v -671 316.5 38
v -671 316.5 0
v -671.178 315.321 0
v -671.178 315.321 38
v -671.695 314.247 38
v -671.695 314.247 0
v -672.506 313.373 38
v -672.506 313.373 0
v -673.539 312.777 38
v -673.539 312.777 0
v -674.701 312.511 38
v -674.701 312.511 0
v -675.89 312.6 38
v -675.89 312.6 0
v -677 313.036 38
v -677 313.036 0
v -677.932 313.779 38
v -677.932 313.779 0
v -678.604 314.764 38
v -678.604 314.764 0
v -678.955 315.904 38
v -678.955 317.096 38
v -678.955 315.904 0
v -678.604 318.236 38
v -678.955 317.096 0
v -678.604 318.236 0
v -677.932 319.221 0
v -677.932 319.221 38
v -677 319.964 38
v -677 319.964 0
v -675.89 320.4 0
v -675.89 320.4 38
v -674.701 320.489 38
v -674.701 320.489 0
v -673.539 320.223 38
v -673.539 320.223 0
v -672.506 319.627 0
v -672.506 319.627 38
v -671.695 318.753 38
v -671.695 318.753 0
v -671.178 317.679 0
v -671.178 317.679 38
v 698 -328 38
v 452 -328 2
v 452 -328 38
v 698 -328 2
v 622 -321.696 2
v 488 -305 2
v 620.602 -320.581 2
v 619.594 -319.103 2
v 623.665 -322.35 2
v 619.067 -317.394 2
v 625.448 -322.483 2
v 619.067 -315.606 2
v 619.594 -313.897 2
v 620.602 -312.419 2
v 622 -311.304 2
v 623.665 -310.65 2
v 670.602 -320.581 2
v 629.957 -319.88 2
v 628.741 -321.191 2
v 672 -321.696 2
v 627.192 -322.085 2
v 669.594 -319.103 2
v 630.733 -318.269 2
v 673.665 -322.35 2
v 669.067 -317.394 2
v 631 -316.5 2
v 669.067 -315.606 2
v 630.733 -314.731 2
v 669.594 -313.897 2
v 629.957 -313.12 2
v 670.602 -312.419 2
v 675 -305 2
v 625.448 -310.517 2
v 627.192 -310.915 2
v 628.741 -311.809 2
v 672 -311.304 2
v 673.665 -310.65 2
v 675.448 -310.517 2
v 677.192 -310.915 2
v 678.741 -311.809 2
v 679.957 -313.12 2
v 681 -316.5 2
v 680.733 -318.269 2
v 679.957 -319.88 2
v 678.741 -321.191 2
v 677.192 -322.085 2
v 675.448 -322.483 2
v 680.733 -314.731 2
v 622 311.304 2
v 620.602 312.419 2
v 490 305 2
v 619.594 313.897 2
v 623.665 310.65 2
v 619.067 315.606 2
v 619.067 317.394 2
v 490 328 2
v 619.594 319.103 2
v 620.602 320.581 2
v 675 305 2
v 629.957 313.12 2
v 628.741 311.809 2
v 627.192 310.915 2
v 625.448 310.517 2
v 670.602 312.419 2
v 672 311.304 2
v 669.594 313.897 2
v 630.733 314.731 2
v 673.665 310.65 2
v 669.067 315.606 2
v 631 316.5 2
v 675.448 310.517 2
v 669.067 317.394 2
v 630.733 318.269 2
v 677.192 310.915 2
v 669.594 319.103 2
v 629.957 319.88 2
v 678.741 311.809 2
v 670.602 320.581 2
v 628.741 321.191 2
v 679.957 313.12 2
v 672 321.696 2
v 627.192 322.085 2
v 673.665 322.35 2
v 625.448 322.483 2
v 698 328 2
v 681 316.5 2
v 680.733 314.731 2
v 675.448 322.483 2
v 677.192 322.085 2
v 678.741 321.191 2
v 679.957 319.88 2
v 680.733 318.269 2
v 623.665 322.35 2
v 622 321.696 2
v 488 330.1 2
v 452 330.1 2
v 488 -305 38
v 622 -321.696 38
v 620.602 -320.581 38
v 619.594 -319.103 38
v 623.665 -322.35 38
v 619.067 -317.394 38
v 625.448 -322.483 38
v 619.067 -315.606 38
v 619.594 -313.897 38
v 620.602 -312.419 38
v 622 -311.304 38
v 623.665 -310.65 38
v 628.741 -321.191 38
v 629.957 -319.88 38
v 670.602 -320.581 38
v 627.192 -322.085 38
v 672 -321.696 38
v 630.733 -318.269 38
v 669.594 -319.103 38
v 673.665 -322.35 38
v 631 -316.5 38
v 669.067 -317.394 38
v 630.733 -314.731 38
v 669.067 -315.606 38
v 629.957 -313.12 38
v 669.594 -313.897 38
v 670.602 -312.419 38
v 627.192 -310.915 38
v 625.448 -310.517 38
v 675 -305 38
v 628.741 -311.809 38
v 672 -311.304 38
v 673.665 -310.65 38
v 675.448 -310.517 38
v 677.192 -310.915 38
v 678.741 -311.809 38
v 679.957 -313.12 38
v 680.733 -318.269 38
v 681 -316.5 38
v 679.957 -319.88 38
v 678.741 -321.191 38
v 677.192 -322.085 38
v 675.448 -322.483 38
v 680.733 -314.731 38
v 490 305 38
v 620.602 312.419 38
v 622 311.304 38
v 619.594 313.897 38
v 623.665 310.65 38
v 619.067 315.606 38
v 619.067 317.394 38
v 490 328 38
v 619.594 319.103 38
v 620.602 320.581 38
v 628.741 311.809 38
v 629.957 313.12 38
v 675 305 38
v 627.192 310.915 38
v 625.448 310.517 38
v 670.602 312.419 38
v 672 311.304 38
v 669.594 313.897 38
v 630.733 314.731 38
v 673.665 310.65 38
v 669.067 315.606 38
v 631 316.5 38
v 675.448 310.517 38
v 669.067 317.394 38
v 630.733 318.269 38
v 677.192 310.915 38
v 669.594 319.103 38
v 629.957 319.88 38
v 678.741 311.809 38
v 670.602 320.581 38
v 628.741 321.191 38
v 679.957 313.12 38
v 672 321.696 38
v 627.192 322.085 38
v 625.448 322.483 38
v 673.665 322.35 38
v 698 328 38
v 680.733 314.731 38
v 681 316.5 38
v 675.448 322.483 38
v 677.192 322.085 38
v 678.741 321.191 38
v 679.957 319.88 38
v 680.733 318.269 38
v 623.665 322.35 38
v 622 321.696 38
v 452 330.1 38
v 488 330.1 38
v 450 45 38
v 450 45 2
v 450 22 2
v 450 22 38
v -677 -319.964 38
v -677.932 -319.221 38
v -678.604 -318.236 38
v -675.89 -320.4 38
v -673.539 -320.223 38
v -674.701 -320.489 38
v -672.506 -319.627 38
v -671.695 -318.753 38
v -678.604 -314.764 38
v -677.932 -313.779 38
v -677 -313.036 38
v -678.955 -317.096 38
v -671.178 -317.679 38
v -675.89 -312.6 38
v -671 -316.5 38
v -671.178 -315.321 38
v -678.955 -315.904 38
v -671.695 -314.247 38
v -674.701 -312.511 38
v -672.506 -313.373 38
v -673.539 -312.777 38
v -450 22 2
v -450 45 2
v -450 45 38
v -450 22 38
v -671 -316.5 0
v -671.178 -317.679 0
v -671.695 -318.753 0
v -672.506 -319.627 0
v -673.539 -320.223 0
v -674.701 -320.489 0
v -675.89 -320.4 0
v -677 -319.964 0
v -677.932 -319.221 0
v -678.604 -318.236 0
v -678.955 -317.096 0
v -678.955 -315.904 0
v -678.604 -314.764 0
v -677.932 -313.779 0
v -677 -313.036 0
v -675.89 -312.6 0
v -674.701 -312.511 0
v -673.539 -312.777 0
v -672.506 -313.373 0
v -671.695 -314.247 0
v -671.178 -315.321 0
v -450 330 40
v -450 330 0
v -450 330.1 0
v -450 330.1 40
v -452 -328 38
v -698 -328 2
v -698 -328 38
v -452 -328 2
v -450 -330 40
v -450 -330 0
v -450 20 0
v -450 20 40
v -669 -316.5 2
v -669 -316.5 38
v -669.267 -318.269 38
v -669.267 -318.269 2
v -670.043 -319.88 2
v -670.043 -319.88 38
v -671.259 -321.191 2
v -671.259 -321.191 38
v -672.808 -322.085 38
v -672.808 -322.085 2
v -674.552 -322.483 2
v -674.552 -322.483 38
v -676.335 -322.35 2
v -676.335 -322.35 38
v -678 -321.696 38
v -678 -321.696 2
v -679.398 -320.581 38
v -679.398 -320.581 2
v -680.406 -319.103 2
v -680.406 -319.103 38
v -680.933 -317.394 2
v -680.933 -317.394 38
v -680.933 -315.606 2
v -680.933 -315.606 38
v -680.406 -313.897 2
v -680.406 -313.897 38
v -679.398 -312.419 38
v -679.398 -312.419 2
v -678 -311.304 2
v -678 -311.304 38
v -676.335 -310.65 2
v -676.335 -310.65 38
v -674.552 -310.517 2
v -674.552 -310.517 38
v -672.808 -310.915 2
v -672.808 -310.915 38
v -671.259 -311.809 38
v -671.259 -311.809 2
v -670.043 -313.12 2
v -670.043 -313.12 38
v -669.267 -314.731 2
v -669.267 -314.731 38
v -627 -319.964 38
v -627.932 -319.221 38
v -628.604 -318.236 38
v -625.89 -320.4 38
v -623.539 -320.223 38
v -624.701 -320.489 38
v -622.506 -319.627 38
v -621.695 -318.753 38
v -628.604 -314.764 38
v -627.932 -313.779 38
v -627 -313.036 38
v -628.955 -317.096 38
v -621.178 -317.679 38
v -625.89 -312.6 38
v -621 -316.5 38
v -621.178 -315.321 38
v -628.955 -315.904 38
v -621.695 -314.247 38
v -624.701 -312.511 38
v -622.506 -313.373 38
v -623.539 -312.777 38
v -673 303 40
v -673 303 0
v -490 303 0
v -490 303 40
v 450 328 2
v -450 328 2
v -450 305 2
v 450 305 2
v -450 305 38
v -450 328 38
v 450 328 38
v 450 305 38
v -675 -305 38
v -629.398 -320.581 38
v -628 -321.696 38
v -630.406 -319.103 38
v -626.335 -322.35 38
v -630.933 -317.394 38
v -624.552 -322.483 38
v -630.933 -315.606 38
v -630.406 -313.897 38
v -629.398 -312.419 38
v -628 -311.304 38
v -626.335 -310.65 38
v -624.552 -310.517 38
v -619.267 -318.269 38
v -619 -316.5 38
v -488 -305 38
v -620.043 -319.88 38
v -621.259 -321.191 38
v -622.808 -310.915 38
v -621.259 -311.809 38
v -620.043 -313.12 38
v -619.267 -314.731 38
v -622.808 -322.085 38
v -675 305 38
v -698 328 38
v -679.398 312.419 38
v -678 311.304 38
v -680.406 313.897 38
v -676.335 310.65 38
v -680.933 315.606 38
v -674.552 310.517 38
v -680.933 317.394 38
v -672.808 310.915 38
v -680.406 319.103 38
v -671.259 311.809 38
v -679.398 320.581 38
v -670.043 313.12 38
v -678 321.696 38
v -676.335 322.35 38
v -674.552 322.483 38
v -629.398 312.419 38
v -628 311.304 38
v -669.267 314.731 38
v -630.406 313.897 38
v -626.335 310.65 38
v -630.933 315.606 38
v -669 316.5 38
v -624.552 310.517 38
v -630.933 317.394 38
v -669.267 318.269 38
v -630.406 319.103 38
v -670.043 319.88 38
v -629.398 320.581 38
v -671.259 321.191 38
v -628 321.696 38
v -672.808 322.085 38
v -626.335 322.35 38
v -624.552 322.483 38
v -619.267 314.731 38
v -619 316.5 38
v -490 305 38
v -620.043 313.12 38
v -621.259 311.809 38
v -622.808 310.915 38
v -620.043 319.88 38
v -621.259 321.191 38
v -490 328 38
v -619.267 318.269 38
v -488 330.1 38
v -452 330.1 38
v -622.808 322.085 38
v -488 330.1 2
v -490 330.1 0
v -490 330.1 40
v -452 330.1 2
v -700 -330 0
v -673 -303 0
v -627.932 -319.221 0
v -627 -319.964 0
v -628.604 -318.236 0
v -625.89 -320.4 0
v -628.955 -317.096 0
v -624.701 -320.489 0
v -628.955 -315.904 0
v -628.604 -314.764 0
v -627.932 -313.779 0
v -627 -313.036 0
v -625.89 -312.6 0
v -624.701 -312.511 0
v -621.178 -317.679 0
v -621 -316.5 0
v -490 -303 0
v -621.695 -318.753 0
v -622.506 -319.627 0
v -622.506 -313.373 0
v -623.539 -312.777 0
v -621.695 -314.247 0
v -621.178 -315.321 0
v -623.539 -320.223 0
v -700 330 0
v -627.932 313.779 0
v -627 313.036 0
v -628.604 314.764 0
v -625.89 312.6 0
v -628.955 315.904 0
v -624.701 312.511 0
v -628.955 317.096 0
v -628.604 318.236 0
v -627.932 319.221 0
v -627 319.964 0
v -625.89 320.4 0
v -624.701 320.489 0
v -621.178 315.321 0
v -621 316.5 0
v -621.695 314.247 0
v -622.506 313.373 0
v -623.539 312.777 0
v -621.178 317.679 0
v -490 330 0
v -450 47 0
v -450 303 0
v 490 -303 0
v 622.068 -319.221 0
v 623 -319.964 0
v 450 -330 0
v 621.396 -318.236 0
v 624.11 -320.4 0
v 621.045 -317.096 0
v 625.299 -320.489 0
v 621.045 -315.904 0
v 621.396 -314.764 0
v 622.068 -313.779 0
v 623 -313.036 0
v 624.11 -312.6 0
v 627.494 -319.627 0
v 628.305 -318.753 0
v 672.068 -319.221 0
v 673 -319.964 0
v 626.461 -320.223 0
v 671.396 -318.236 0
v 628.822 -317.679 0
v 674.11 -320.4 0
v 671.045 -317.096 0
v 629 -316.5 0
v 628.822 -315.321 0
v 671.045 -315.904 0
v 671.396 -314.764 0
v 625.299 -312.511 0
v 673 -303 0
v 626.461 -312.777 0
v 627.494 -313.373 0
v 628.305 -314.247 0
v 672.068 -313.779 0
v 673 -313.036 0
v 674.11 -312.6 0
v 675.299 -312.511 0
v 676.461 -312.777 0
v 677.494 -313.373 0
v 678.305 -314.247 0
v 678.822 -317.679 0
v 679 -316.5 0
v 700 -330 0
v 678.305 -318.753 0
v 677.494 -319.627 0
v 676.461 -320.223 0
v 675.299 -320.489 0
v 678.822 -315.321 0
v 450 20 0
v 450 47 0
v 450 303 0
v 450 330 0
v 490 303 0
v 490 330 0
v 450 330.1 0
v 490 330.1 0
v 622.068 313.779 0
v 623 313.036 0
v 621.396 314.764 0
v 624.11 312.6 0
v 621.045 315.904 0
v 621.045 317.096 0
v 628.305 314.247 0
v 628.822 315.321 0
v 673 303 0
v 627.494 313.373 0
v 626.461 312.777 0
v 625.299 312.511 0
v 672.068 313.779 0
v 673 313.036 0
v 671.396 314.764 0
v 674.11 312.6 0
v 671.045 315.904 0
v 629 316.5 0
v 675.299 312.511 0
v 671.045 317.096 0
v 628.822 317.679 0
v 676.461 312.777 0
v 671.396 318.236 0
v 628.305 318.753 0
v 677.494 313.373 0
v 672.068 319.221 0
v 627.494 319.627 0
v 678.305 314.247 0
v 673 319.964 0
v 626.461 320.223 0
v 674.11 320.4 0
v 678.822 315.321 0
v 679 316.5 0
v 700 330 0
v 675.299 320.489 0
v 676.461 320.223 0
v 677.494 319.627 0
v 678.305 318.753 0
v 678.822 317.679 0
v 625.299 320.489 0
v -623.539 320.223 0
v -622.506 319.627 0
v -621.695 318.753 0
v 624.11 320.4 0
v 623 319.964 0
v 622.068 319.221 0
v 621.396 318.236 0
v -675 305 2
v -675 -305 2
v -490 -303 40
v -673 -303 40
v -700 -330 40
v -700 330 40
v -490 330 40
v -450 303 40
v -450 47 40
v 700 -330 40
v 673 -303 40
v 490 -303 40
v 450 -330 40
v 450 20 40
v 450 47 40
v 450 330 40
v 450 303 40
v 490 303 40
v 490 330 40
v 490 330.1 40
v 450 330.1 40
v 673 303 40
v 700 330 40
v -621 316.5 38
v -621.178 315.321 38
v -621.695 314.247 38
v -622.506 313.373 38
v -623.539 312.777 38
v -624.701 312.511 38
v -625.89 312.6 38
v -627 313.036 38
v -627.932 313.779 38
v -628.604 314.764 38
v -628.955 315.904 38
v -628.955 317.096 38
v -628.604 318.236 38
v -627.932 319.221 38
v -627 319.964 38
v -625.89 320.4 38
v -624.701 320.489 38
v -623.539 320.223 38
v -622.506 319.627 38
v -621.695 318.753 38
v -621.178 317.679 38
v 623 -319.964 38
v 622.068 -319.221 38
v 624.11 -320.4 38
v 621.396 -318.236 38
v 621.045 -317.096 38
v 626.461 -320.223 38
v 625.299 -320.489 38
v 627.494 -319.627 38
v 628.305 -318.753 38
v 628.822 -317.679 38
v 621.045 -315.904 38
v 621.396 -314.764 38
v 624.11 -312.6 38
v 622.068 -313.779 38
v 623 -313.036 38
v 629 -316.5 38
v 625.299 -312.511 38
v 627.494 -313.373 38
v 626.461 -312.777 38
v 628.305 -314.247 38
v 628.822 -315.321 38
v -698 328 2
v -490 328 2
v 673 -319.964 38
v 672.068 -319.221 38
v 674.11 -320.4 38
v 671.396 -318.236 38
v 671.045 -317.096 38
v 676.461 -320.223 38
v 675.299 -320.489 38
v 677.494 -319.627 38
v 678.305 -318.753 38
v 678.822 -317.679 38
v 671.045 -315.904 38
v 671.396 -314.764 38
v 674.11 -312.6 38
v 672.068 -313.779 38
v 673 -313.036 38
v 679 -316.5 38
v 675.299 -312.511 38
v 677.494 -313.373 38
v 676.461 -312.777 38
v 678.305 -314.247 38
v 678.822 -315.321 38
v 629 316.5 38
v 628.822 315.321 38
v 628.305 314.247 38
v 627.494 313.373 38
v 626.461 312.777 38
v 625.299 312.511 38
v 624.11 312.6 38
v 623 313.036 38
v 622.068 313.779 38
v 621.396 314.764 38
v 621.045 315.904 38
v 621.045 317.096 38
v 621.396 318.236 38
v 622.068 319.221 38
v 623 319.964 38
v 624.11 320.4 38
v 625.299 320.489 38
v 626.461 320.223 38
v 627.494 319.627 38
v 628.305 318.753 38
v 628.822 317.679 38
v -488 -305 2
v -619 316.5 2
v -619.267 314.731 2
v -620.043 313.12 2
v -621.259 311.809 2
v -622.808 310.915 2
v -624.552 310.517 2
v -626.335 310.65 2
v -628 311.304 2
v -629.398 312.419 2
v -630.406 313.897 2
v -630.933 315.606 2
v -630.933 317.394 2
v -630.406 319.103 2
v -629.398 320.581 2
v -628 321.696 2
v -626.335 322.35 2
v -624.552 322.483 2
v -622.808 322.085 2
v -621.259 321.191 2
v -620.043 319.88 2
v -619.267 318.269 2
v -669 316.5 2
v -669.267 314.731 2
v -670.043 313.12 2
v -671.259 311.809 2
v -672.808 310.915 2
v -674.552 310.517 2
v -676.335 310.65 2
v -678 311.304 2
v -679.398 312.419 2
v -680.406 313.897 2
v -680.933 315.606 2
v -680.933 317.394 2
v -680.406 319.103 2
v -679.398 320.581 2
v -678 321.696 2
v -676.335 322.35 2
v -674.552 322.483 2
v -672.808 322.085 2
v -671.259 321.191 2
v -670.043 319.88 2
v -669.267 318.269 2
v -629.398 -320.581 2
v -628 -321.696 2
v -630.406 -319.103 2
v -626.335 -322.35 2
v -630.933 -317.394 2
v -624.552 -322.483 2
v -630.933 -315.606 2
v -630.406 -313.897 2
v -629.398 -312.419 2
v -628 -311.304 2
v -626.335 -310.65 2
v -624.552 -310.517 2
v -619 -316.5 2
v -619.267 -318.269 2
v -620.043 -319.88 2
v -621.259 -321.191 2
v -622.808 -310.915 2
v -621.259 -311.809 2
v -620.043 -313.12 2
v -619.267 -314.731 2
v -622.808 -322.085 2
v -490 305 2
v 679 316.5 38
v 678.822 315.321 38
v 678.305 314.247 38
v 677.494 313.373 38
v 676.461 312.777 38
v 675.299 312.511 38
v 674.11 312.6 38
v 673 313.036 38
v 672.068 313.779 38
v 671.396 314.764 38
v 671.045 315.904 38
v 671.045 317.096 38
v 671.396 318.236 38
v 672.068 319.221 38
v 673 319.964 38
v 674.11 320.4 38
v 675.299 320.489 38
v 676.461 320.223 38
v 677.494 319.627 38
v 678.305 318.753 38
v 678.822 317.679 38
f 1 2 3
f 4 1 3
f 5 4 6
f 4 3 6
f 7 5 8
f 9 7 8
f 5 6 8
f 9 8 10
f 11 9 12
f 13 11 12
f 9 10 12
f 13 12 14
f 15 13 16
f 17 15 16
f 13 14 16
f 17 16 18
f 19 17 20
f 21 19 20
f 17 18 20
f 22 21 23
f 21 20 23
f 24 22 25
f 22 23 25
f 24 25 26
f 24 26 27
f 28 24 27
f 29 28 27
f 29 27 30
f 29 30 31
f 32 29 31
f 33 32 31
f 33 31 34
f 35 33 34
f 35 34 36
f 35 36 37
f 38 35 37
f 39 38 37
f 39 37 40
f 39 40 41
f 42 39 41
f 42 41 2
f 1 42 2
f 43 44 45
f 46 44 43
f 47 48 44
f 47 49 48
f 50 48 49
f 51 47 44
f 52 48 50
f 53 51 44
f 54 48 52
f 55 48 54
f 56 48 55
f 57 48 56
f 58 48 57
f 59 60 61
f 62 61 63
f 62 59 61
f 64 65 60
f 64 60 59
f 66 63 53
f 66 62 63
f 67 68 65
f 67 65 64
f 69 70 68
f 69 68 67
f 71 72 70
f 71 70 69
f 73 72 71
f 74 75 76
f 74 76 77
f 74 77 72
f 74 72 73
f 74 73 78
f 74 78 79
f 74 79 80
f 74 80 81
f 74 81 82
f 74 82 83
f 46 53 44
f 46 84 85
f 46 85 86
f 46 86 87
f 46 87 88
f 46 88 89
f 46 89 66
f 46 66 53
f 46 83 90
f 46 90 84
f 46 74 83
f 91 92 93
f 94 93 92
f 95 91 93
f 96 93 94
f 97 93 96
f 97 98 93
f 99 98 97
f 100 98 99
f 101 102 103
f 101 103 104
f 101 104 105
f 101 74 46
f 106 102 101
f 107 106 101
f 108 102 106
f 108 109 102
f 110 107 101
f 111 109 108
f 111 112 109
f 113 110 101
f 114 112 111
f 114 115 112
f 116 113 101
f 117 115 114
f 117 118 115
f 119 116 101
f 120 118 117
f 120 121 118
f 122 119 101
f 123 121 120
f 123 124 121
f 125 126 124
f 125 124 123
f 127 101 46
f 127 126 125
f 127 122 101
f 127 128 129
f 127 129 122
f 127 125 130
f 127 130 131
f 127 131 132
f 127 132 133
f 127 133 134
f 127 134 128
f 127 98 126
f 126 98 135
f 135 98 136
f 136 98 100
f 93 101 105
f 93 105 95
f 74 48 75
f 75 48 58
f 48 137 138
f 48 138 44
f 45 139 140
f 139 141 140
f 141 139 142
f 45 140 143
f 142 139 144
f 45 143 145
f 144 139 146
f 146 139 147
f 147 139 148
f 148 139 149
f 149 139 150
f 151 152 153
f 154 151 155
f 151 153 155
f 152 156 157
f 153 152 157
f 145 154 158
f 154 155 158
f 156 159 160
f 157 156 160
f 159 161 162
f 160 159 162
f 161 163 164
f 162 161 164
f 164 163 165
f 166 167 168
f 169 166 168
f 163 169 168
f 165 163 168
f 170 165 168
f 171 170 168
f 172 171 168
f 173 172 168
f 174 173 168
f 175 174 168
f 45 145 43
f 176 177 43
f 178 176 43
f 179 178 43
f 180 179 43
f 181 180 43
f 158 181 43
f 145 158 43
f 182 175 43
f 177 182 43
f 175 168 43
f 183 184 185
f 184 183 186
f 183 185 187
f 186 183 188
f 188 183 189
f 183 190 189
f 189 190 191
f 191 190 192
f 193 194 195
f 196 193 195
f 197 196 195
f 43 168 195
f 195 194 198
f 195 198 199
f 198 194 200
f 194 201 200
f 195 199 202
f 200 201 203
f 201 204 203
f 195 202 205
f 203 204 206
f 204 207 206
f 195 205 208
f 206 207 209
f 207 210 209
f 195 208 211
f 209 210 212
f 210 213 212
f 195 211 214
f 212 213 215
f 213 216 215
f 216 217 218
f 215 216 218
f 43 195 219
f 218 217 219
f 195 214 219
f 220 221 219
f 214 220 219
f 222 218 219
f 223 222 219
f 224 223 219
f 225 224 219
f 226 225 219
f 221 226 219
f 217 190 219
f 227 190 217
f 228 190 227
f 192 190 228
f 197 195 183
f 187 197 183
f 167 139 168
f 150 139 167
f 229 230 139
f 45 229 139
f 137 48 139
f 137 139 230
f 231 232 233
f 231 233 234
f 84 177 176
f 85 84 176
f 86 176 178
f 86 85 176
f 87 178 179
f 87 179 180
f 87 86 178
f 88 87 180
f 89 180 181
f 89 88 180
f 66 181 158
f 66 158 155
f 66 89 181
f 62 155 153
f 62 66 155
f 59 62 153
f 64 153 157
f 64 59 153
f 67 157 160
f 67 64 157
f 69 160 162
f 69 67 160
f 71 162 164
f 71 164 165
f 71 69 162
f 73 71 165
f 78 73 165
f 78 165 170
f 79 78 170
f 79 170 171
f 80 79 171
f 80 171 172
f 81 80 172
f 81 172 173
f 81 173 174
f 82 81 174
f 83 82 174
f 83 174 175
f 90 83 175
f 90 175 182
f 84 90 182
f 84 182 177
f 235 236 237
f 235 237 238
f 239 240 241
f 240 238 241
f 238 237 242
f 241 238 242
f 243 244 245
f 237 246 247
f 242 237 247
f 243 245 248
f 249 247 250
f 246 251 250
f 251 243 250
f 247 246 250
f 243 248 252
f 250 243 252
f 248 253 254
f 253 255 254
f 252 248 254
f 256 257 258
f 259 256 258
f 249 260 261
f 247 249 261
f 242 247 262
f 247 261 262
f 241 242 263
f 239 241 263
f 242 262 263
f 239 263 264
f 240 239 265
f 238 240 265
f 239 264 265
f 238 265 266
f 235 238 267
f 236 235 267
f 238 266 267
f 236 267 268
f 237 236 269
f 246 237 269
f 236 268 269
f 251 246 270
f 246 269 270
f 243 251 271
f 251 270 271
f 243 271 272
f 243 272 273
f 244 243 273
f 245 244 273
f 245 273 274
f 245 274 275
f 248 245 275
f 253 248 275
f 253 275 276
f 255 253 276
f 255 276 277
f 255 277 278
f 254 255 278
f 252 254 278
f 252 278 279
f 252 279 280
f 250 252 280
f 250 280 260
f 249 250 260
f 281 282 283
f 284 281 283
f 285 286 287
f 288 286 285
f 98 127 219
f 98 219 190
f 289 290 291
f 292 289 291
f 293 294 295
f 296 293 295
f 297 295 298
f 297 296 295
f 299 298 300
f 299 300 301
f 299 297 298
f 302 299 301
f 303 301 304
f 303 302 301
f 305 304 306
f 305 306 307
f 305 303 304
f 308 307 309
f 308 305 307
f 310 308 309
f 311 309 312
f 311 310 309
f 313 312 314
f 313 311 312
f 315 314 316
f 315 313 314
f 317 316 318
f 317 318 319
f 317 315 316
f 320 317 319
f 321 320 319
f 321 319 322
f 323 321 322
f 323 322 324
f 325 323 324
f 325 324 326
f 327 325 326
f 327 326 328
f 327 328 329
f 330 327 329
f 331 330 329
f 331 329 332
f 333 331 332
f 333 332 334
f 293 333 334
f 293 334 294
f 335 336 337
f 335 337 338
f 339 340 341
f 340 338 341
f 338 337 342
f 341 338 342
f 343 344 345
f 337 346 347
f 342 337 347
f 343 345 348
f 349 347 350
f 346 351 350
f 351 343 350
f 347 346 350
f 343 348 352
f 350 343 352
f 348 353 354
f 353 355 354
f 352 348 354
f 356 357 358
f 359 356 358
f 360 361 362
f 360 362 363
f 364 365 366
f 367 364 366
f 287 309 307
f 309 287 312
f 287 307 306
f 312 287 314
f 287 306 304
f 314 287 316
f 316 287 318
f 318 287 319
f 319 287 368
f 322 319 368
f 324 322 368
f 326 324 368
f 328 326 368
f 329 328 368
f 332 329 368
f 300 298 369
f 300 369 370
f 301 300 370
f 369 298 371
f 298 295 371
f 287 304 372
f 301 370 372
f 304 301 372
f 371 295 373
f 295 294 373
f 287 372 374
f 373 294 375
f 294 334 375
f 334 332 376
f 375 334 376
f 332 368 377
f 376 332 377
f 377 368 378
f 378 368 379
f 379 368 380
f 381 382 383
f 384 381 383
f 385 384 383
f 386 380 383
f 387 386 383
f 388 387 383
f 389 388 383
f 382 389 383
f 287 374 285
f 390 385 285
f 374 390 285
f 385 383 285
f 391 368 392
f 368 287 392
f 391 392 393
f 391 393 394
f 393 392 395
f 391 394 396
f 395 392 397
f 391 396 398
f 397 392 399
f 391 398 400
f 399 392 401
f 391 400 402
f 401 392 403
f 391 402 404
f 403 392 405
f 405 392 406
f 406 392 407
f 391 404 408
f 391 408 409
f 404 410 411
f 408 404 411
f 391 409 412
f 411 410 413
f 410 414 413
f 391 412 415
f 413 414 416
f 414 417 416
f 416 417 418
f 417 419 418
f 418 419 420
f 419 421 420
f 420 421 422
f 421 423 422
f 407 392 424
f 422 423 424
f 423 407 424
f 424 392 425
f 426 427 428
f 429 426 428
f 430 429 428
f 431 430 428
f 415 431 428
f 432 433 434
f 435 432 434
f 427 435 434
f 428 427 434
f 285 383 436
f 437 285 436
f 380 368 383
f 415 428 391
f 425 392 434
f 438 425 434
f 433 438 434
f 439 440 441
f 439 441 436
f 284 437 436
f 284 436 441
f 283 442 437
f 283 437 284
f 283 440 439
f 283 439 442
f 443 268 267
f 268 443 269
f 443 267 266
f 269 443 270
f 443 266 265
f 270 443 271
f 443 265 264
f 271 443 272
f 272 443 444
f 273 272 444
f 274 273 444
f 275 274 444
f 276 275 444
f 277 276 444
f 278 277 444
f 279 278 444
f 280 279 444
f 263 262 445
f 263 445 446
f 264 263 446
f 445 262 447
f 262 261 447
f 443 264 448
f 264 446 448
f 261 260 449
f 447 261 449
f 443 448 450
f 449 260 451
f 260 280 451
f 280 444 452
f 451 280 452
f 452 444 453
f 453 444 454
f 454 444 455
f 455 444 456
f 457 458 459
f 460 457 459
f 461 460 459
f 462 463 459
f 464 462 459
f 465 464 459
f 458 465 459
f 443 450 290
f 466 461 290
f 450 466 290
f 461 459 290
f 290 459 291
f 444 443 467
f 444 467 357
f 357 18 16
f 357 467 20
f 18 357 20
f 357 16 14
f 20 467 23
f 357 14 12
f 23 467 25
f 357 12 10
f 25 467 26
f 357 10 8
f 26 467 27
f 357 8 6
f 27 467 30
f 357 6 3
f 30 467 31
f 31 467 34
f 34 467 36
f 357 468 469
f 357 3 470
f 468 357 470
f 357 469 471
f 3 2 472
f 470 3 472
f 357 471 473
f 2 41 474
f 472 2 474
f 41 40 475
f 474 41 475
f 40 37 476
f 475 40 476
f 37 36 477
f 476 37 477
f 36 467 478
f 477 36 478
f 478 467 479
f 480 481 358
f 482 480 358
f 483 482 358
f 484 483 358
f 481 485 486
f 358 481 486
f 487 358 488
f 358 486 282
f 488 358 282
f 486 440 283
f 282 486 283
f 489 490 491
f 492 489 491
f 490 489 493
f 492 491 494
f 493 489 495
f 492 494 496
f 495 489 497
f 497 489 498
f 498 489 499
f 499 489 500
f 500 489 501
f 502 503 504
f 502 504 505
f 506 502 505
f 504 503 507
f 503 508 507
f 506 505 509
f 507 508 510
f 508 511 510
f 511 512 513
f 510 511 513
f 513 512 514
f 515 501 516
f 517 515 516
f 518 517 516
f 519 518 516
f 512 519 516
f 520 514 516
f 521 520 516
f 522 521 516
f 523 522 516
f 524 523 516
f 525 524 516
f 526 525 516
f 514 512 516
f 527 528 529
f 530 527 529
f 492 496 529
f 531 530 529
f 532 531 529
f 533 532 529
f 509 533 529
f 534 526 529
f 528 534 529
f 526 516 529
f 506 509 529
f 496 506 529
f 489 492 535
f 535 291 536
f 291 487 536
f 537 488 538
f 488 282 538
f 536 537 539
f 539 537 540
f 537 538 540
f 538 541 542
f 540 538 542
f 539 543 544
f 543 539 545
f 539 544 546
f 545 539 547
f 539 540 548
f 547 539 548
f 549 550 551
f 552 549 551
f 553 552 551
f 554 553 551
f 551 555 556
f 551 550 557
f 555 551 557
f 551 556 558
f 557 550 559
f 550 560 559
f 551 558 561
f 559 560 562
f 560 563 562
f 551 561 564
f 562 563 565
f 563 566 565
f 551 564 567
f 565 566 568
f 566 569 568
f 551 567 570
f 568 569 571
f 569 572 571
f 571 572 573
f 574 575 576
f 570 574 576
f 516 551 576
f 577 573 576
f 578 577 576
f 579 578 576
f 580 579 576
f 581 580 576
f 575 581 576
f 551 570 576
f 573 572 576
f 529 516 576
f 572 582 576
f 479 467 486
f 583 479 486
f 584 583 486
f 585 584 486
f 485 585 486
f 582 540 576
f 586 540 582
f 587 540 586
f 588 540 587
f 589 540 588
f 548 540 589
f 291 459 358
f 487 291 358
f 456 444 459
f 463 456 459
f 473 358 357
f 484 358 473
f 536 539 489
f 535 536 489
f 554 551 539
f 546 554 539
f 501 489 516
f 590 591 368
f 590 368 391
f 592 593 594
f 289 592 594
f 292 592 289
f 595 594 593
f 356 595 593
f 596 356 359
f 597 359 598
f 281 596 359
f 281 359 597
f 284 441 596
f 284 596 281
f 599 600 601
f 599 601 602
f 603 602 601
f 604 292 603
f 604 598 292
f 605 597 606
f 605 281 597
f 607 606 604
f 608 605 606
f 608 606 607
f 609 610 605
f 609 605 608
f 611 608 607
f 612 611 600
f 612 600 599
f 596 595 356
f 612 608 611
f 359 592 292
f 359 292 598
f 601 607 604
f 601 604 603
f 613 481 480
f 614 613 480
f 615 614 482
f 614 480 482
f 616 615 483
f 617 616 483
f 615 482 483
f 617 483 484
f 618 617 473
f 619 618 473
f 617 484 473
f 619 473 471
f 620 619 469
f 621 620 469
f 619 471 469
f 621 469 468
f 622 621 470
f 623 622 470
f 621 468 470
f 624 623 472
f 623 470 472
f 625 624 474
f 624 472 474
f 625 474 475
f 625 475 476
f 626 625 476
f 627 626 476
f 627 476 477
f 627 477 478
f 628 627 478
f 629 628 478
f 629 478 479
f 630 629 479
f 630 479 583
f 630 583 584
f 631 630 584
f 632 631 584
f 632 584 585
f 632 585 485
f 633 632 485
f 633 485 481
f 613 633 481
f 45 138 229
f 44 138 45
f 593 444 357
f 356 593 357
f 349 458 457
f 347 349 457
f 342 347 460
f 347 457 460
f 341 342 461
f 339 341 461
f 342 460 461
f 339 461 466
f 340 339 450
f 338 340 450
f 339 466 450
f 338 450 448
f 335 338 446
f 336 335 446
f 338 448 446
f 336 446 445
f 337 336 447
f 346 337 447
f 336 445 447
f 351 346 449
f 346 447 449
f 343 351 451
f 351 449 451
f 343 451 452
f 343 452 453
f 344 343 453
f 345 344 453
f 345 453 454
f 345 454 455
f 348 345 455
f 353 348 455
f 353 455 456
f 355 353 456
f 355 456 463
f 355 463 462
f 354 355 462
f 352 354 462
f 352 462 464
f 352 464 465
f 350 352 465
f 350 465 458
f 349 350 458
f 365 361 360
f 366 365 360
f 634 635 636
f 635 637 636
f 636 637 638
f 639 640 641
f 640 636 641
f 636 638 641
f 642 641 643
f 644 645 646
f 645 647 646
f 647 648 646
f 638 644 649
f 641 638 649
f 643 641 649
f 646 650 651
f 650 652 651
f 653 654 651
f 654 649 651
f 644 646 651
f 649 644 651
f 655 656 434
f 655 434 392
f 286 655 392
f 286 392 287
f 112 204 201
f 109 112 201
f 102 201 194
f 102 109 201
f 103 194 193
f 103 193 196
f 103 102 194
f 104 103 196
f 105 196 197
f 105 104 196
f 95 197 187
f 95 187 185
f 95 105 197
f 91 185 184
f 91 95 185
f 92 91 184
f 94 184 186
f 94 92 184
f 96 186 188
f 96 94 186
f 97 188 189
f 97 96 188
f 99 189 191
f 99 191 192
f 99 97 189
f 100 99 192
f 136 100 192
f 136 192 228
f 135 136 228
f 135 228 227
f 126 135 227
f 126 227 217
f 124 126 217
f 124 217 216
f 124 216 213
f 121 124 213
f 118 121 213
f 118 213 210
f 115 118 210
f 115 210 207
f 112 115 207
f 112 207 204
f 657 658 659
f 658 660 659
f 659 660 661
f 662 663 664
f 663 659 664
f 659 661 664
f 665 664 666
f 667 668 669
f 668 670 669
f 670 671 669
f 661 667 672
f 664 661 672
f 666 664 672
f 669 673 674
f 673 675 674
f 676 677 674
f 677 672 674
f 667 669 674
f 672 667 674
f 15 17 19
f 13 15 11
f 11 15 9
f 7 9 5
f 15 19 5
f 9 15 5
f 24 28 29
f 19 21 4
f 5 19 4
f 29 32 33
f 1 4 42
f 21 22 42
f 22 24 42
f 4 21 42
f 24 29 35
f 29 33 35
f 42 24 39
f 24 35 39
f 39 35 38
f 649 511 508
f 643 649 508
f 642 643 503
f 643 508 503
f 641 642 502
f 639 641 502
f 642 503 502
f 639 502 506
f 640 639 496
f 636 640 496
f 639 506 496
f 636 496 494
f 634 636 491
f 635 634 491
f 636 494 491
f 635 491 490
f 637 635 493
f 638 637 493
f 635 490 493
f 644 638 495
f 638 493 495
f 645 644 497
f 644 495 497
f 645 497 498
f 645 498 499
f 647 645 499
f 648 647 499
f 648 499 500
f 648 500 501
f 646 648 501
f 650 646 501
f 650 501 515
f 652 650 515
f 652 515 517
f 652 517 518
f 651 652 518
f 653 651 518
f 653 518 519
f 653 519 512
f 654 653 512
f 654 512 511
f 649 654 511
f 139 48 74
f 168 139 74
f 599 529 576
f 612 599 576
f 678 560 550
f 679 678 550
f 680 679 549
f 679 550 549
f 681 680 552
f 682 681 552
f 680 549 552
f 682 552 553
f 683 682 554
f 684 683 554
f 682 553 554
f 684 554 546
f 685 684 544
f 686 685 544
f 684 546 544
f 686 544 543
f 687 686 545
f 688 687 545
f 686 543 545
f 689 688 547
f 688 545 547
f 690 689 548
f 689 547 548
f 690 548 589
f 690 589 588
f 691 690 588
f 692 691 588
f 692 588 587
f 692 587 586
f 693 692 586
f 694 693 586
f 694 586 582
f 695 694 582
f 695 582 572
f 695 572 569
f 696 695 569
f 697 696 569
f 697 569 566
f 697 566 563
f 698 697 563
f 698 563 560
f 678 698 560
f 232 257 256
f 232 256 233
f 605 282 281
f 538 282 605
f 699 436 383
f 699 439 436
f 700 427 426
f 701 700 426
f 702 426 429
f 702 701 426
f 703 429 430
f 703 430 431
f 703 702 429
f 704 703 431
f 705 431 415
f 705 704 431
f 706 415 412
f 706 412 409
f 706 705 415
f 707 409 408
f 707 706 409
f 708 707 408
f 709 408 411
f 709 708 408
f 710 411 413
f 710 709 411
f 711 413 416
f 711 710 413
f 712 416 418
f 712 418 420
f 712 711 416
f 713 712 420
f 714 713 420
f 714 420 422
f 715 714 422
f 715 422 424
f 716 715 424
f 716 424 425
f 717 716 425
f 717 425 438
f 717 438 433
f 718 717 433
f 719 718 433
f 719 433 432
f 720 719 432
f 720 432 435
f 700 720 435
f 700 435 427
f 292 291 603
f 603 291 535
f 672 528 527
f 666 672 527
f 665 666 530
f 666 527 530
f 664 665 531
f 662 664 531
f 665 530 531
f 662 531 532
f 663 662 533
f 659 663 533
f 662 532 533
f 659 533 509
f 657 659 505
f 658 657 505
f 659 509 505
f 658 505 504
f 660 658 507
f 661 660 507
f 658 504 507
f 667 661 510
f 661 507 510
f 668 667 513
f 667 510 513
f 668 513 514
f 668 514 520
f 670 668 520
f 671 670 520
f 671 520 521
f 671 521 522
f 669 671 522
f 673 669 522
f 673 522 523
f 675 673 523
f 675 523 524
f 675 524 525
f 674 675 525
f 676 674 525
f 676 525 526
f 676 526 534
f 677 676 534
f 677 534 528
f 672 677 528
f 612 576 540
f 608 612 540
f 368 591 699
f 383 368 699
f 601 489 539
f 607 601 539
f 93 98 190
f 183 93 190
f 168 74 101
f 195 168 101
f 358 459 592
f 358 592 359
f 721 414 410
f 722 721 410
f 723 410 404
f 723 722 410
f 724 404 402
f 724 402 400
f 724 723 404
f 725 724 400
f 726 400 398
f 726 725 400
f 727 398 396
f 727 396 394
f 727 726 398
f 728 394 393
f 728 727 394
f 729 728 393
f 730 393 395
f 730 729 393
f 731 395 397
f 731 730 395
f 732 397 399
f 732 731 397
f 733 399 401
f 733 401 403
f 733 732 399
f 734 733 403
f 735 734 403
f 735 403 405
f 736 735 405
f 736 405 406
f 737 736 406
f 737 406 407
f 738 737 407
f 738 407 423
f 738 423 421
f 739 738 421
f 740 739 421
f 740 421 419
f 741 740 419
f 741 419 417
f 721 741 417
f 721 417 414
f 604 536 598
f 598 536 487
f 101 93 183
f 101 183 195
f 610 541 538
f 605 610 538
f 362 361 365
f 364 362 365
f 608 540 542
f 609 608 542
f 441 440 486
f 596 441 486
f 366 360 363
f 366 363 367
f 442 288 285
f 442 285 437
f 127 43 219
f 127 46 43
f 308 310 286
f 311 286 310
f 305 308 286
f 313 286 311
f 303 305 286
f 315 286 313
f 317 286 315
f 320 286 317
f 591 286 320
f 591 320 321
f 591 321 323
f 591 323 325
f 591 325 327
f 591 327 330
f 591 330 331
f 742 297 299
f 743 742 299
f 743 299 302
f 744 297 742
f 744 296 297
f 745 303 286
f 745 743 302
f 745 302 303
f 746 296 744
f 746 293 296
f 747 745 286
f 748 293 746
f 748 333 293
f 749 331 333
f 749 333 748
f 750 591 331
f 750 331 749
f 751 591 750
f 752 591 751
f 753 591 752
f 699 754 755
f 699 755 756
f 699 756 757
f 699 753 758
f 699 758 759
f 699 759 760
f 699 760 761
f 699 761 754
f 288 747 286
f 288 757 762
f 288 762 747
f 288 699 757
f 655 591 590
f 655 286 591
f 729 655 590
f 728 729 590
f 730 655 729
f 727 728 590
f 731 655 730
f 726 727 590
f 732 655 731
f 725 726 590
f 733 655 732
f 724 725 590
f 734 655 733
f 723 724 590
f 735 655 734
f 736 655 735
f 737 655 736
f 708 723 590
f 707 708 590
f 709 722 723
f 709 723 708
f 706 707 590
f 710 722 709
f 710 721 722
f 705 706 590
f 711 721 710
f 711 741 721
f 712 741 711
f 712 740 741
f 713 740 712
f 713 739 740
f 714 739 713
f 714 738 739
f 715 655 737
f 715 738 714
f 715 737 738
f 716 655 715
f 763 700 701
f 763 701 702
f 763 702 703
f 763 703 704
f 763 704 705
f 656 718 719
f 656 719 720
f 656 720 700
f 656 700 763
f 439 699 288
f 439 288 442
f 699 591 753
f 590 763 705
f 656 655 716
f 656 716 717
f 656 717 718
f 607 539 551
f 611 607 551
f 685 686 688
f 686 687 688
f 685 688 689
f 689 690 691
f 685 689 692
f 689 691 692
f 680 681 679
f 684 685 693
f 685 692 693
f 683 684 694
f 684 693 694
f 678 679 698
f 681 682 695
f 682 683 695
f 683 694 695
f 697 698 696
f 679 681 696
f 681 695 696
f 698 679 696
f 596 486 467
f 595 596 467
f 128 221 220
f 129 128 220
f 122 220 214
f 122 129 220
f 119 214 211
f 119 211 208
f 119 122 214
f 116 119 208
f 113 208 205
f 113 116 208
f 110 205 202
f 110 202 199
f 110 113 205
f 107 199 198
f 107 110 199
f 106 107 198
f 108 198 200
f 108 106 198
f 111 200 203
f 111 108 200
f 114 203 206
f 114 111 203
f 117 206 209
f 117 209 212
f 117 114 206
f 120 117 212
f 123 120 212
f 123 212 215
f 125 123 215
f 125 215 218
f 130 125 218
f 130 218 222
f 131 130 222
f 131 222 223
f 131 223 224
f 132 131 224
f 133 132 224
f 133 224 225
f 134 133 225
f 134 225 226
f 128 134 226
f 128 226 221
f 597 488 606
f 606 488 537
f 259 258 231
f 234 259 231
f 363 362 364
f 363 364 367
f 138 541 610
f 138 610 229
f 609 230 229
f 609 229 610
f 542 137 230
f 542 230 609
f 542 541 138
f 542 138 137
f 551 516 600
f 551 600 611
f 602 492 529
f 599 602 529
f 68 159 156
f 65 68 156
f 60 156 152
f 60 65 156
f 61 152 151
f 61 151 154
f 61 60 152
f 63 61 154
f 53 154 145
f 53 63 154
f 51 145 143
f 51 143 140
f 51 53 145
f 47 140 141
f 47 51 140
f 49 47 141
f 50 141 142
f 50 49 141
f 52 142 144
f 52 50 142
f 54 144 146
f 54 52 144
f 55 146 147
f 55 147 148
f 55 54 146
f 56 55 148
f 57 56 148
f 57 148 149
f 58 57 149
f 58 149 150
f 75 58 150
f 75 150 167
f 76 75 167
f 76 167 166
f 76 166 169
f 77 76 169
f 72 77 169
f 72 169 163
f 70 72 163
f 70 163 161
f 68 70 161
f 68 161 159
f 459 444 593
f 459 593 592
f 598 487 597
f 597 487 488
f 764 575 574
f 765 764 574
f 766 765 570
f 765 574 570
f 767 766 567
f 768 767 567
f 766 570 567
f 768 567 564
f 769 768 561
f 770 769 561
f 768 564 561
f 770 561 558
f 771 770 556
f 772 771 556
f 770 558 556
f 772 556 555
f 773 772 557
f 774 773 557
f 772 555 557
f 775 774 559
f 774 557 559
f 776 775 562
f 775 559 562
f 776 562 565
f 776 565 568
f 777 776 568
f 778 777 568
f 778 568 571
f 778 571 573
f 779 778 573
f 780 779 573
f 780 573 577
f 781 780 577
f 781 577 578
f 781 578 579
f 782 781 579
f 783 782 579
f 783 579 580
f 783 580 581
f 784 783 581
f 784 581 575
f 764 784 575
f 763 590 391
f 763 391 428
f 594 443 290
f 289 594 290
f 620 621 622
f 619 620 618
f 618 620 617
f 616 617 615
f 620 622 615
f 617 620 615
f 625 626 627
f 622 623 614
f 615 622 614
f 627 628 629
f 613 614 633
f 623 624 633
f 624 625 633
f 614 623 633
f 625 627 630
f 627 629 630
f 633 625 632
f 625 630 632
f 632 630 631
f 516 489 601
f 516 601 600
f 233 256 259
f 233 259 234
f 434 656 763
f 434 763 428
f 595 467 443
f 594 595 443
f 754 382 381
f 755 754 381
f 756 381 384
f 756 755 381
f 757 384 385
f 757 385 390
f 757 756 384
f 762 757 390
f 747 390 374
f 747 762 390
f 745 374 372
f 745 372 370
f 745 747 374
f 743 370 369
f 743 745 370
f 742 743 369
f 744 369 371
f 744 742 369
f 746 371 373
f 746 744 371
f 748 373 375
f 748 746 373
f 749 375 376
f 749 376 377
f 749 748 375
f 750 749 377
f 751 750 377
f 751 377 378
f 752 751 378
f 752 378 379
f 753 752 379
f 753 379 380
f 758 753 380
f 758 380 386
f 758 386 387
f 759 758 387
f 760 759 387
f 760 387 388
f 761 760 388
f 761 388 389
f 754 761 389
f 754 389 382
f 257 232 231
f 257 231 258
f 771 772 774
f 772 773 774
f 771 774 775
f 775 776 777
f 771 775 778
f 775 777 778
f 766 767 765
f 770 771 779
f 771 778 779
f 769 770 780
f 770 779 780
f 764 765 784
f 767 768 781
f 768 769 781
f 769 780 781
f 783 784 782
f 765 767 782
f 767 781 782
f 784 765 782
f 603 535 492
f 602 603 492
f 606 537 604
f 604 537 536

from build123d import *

# Parameters (mm, degrees)
F0_W     = 40
F0_H     = 0.1
F0_H_2   = 27
F0_W_2   = 900
F0_W_3   = 183
F0_H_3   = 606
F1_DEPTH = 40
F2_T     = -2
F3_DEPTH = 390
F4_R     = 4
F5_DEPTH = 25
F4_R_2   = 6
F6_DEPTH = 40


with BuildPart() as f1:
    # F0 (on Top) → F1 (new body)
    with BuildSketch(Plane.XY):
        with Locations((470, 330.05)):
            Rectangle(F0_W, F0_H)
        with Locations((-470, 330.05)):
            Rectangle(F0_W, F0_H)
        with Locations((470, 316.5)):
            Rectangle(F0_W, F0_H_2)
        with Locations((0, 316.5)):
            Rectangle(F0_W_2, F0_H_2)
        with Locations((-470, 316.5)):
            Rectangle(F0_W, F0_H_2)
        Polygon((450, -330), (700, -330), (700, 330), (490, 330), (490, 303), (450, 303), (450, 47), (-450, 47), (-450, 303), (-490, 303), (-490, 330), (-700, 330), (-700, -330), (-450, -330), (-450, 20), (450, 20), align=None)
        with Locations((-581.5, 0)):
            Rectangle(F0_W_3, F0_H_3, mode=Mode.SUBTRACT)
        with Locations((581.5, 0)):
            Rectangle(F0_W_3, F0_H_3, mode=Mode.SUBTRACT)
    extrude(amount=F1_DEPTH)

    # F2
    f2_openings = [f1.faces().sort_by_distance(p)[0] for p in [
        (-470, 330.1, 20),
        (470, 330.1, 20),
    ]]
    offset(amount=F2_T, openings=f2_openings, kind=Kind.INTERSECTION)

    # F3 (add): faces of the model
    f3_faces = [f1.faces().sort_by_distance(p)[0] for p in [
        (489.4343145751, 330.1, 20),
        (-450.5656854249, 330.1, 20),
    ]]
    extrude(f3_faces, amount=-F3_DEPTH)

    # F4 (on face) → F5 (cut)
    with BuildSketch(Plane(origin=(0, 0, 0), x_dir=(1, 0, 0), z_dir=(0, 0, -1))):
        with Locations((-675, -316.5)):
            Circle(F4_R)
        with Locations((-625, -316.5)):
            Circle(F4_R)
        with Locations((675, -316.5)):
            Circle(F4_R)
        with Locations((625, -316.5)):
            Circle(F4_R)
        with Locations((-675, 316.5)):
            Circle(F4_R)
        with Locations((-625, 316.5)):
            Circle(F4_R)
        with Locations((675, 316.5)):
            Circle(F4_R)
        with Locations((625, 316.5)):
            Circle(F4_R)
    extrude(amount=-F5_DEPTH, mode=Mode.SUBTRACT)

    # F4 (on face) → F6 (join)
    with BuildSketch(Plane(origin=(0, 0, 0), x_dir=(1, 0, 0), z_dir=(0, 0, -1))):
        with Locations((-675, -316.5)):
            Circle(F4_R_2)
        with Locations((-675, -316.5)):
            Circle(F4_R, mode=Mode.SUBTRACT)
        with Locations((-625, -316.5)):
            Circle(F4_R_2)
        with Locations((-625, -316.5)):
            Circle(F4_R, mode=Mode.SUBTRACT)
        with Locations((-675, 316.5)):
            Circle(F4_R_2)
        with Locations((-675, 316.5)):
            Circle(F4_R, mode=Mode.SUBTRACT)
        with Locations((-625, 316.5)):
            Circle(F4_R_2)
        with Locations((-625, 316.5)):
            Circle(F4_R, mode=Mode.SUBTRACT)
        with Locations((675, 316.5)):
            Circle(F4_R_2)
        with Locations((675, 316.5)):
            Circle(F4_R, mode=Mode.SUBTRACT)
        with Locations((625, 316.5)):
            Circle(F4_R_2)
        with Locations((625, 316.5)):
            Circle(F4_R, mode=Mode.SUBTRACT)
        with Locations((675, -316.5)):
            Circle(F4_R_2)
        with Locations((675, -316.5)):
            Circle(F4_R, mode=Mode.SUBTRACT)
        with Locations((625, -316.5)):
            Circle(F4_R_2)
        with Locations((625, -316.5)):
            Circle(F4_R, mode=Mode.SUBTRACT)
    extrude(amount=-F6_DEPTH)


solid = f1.part
